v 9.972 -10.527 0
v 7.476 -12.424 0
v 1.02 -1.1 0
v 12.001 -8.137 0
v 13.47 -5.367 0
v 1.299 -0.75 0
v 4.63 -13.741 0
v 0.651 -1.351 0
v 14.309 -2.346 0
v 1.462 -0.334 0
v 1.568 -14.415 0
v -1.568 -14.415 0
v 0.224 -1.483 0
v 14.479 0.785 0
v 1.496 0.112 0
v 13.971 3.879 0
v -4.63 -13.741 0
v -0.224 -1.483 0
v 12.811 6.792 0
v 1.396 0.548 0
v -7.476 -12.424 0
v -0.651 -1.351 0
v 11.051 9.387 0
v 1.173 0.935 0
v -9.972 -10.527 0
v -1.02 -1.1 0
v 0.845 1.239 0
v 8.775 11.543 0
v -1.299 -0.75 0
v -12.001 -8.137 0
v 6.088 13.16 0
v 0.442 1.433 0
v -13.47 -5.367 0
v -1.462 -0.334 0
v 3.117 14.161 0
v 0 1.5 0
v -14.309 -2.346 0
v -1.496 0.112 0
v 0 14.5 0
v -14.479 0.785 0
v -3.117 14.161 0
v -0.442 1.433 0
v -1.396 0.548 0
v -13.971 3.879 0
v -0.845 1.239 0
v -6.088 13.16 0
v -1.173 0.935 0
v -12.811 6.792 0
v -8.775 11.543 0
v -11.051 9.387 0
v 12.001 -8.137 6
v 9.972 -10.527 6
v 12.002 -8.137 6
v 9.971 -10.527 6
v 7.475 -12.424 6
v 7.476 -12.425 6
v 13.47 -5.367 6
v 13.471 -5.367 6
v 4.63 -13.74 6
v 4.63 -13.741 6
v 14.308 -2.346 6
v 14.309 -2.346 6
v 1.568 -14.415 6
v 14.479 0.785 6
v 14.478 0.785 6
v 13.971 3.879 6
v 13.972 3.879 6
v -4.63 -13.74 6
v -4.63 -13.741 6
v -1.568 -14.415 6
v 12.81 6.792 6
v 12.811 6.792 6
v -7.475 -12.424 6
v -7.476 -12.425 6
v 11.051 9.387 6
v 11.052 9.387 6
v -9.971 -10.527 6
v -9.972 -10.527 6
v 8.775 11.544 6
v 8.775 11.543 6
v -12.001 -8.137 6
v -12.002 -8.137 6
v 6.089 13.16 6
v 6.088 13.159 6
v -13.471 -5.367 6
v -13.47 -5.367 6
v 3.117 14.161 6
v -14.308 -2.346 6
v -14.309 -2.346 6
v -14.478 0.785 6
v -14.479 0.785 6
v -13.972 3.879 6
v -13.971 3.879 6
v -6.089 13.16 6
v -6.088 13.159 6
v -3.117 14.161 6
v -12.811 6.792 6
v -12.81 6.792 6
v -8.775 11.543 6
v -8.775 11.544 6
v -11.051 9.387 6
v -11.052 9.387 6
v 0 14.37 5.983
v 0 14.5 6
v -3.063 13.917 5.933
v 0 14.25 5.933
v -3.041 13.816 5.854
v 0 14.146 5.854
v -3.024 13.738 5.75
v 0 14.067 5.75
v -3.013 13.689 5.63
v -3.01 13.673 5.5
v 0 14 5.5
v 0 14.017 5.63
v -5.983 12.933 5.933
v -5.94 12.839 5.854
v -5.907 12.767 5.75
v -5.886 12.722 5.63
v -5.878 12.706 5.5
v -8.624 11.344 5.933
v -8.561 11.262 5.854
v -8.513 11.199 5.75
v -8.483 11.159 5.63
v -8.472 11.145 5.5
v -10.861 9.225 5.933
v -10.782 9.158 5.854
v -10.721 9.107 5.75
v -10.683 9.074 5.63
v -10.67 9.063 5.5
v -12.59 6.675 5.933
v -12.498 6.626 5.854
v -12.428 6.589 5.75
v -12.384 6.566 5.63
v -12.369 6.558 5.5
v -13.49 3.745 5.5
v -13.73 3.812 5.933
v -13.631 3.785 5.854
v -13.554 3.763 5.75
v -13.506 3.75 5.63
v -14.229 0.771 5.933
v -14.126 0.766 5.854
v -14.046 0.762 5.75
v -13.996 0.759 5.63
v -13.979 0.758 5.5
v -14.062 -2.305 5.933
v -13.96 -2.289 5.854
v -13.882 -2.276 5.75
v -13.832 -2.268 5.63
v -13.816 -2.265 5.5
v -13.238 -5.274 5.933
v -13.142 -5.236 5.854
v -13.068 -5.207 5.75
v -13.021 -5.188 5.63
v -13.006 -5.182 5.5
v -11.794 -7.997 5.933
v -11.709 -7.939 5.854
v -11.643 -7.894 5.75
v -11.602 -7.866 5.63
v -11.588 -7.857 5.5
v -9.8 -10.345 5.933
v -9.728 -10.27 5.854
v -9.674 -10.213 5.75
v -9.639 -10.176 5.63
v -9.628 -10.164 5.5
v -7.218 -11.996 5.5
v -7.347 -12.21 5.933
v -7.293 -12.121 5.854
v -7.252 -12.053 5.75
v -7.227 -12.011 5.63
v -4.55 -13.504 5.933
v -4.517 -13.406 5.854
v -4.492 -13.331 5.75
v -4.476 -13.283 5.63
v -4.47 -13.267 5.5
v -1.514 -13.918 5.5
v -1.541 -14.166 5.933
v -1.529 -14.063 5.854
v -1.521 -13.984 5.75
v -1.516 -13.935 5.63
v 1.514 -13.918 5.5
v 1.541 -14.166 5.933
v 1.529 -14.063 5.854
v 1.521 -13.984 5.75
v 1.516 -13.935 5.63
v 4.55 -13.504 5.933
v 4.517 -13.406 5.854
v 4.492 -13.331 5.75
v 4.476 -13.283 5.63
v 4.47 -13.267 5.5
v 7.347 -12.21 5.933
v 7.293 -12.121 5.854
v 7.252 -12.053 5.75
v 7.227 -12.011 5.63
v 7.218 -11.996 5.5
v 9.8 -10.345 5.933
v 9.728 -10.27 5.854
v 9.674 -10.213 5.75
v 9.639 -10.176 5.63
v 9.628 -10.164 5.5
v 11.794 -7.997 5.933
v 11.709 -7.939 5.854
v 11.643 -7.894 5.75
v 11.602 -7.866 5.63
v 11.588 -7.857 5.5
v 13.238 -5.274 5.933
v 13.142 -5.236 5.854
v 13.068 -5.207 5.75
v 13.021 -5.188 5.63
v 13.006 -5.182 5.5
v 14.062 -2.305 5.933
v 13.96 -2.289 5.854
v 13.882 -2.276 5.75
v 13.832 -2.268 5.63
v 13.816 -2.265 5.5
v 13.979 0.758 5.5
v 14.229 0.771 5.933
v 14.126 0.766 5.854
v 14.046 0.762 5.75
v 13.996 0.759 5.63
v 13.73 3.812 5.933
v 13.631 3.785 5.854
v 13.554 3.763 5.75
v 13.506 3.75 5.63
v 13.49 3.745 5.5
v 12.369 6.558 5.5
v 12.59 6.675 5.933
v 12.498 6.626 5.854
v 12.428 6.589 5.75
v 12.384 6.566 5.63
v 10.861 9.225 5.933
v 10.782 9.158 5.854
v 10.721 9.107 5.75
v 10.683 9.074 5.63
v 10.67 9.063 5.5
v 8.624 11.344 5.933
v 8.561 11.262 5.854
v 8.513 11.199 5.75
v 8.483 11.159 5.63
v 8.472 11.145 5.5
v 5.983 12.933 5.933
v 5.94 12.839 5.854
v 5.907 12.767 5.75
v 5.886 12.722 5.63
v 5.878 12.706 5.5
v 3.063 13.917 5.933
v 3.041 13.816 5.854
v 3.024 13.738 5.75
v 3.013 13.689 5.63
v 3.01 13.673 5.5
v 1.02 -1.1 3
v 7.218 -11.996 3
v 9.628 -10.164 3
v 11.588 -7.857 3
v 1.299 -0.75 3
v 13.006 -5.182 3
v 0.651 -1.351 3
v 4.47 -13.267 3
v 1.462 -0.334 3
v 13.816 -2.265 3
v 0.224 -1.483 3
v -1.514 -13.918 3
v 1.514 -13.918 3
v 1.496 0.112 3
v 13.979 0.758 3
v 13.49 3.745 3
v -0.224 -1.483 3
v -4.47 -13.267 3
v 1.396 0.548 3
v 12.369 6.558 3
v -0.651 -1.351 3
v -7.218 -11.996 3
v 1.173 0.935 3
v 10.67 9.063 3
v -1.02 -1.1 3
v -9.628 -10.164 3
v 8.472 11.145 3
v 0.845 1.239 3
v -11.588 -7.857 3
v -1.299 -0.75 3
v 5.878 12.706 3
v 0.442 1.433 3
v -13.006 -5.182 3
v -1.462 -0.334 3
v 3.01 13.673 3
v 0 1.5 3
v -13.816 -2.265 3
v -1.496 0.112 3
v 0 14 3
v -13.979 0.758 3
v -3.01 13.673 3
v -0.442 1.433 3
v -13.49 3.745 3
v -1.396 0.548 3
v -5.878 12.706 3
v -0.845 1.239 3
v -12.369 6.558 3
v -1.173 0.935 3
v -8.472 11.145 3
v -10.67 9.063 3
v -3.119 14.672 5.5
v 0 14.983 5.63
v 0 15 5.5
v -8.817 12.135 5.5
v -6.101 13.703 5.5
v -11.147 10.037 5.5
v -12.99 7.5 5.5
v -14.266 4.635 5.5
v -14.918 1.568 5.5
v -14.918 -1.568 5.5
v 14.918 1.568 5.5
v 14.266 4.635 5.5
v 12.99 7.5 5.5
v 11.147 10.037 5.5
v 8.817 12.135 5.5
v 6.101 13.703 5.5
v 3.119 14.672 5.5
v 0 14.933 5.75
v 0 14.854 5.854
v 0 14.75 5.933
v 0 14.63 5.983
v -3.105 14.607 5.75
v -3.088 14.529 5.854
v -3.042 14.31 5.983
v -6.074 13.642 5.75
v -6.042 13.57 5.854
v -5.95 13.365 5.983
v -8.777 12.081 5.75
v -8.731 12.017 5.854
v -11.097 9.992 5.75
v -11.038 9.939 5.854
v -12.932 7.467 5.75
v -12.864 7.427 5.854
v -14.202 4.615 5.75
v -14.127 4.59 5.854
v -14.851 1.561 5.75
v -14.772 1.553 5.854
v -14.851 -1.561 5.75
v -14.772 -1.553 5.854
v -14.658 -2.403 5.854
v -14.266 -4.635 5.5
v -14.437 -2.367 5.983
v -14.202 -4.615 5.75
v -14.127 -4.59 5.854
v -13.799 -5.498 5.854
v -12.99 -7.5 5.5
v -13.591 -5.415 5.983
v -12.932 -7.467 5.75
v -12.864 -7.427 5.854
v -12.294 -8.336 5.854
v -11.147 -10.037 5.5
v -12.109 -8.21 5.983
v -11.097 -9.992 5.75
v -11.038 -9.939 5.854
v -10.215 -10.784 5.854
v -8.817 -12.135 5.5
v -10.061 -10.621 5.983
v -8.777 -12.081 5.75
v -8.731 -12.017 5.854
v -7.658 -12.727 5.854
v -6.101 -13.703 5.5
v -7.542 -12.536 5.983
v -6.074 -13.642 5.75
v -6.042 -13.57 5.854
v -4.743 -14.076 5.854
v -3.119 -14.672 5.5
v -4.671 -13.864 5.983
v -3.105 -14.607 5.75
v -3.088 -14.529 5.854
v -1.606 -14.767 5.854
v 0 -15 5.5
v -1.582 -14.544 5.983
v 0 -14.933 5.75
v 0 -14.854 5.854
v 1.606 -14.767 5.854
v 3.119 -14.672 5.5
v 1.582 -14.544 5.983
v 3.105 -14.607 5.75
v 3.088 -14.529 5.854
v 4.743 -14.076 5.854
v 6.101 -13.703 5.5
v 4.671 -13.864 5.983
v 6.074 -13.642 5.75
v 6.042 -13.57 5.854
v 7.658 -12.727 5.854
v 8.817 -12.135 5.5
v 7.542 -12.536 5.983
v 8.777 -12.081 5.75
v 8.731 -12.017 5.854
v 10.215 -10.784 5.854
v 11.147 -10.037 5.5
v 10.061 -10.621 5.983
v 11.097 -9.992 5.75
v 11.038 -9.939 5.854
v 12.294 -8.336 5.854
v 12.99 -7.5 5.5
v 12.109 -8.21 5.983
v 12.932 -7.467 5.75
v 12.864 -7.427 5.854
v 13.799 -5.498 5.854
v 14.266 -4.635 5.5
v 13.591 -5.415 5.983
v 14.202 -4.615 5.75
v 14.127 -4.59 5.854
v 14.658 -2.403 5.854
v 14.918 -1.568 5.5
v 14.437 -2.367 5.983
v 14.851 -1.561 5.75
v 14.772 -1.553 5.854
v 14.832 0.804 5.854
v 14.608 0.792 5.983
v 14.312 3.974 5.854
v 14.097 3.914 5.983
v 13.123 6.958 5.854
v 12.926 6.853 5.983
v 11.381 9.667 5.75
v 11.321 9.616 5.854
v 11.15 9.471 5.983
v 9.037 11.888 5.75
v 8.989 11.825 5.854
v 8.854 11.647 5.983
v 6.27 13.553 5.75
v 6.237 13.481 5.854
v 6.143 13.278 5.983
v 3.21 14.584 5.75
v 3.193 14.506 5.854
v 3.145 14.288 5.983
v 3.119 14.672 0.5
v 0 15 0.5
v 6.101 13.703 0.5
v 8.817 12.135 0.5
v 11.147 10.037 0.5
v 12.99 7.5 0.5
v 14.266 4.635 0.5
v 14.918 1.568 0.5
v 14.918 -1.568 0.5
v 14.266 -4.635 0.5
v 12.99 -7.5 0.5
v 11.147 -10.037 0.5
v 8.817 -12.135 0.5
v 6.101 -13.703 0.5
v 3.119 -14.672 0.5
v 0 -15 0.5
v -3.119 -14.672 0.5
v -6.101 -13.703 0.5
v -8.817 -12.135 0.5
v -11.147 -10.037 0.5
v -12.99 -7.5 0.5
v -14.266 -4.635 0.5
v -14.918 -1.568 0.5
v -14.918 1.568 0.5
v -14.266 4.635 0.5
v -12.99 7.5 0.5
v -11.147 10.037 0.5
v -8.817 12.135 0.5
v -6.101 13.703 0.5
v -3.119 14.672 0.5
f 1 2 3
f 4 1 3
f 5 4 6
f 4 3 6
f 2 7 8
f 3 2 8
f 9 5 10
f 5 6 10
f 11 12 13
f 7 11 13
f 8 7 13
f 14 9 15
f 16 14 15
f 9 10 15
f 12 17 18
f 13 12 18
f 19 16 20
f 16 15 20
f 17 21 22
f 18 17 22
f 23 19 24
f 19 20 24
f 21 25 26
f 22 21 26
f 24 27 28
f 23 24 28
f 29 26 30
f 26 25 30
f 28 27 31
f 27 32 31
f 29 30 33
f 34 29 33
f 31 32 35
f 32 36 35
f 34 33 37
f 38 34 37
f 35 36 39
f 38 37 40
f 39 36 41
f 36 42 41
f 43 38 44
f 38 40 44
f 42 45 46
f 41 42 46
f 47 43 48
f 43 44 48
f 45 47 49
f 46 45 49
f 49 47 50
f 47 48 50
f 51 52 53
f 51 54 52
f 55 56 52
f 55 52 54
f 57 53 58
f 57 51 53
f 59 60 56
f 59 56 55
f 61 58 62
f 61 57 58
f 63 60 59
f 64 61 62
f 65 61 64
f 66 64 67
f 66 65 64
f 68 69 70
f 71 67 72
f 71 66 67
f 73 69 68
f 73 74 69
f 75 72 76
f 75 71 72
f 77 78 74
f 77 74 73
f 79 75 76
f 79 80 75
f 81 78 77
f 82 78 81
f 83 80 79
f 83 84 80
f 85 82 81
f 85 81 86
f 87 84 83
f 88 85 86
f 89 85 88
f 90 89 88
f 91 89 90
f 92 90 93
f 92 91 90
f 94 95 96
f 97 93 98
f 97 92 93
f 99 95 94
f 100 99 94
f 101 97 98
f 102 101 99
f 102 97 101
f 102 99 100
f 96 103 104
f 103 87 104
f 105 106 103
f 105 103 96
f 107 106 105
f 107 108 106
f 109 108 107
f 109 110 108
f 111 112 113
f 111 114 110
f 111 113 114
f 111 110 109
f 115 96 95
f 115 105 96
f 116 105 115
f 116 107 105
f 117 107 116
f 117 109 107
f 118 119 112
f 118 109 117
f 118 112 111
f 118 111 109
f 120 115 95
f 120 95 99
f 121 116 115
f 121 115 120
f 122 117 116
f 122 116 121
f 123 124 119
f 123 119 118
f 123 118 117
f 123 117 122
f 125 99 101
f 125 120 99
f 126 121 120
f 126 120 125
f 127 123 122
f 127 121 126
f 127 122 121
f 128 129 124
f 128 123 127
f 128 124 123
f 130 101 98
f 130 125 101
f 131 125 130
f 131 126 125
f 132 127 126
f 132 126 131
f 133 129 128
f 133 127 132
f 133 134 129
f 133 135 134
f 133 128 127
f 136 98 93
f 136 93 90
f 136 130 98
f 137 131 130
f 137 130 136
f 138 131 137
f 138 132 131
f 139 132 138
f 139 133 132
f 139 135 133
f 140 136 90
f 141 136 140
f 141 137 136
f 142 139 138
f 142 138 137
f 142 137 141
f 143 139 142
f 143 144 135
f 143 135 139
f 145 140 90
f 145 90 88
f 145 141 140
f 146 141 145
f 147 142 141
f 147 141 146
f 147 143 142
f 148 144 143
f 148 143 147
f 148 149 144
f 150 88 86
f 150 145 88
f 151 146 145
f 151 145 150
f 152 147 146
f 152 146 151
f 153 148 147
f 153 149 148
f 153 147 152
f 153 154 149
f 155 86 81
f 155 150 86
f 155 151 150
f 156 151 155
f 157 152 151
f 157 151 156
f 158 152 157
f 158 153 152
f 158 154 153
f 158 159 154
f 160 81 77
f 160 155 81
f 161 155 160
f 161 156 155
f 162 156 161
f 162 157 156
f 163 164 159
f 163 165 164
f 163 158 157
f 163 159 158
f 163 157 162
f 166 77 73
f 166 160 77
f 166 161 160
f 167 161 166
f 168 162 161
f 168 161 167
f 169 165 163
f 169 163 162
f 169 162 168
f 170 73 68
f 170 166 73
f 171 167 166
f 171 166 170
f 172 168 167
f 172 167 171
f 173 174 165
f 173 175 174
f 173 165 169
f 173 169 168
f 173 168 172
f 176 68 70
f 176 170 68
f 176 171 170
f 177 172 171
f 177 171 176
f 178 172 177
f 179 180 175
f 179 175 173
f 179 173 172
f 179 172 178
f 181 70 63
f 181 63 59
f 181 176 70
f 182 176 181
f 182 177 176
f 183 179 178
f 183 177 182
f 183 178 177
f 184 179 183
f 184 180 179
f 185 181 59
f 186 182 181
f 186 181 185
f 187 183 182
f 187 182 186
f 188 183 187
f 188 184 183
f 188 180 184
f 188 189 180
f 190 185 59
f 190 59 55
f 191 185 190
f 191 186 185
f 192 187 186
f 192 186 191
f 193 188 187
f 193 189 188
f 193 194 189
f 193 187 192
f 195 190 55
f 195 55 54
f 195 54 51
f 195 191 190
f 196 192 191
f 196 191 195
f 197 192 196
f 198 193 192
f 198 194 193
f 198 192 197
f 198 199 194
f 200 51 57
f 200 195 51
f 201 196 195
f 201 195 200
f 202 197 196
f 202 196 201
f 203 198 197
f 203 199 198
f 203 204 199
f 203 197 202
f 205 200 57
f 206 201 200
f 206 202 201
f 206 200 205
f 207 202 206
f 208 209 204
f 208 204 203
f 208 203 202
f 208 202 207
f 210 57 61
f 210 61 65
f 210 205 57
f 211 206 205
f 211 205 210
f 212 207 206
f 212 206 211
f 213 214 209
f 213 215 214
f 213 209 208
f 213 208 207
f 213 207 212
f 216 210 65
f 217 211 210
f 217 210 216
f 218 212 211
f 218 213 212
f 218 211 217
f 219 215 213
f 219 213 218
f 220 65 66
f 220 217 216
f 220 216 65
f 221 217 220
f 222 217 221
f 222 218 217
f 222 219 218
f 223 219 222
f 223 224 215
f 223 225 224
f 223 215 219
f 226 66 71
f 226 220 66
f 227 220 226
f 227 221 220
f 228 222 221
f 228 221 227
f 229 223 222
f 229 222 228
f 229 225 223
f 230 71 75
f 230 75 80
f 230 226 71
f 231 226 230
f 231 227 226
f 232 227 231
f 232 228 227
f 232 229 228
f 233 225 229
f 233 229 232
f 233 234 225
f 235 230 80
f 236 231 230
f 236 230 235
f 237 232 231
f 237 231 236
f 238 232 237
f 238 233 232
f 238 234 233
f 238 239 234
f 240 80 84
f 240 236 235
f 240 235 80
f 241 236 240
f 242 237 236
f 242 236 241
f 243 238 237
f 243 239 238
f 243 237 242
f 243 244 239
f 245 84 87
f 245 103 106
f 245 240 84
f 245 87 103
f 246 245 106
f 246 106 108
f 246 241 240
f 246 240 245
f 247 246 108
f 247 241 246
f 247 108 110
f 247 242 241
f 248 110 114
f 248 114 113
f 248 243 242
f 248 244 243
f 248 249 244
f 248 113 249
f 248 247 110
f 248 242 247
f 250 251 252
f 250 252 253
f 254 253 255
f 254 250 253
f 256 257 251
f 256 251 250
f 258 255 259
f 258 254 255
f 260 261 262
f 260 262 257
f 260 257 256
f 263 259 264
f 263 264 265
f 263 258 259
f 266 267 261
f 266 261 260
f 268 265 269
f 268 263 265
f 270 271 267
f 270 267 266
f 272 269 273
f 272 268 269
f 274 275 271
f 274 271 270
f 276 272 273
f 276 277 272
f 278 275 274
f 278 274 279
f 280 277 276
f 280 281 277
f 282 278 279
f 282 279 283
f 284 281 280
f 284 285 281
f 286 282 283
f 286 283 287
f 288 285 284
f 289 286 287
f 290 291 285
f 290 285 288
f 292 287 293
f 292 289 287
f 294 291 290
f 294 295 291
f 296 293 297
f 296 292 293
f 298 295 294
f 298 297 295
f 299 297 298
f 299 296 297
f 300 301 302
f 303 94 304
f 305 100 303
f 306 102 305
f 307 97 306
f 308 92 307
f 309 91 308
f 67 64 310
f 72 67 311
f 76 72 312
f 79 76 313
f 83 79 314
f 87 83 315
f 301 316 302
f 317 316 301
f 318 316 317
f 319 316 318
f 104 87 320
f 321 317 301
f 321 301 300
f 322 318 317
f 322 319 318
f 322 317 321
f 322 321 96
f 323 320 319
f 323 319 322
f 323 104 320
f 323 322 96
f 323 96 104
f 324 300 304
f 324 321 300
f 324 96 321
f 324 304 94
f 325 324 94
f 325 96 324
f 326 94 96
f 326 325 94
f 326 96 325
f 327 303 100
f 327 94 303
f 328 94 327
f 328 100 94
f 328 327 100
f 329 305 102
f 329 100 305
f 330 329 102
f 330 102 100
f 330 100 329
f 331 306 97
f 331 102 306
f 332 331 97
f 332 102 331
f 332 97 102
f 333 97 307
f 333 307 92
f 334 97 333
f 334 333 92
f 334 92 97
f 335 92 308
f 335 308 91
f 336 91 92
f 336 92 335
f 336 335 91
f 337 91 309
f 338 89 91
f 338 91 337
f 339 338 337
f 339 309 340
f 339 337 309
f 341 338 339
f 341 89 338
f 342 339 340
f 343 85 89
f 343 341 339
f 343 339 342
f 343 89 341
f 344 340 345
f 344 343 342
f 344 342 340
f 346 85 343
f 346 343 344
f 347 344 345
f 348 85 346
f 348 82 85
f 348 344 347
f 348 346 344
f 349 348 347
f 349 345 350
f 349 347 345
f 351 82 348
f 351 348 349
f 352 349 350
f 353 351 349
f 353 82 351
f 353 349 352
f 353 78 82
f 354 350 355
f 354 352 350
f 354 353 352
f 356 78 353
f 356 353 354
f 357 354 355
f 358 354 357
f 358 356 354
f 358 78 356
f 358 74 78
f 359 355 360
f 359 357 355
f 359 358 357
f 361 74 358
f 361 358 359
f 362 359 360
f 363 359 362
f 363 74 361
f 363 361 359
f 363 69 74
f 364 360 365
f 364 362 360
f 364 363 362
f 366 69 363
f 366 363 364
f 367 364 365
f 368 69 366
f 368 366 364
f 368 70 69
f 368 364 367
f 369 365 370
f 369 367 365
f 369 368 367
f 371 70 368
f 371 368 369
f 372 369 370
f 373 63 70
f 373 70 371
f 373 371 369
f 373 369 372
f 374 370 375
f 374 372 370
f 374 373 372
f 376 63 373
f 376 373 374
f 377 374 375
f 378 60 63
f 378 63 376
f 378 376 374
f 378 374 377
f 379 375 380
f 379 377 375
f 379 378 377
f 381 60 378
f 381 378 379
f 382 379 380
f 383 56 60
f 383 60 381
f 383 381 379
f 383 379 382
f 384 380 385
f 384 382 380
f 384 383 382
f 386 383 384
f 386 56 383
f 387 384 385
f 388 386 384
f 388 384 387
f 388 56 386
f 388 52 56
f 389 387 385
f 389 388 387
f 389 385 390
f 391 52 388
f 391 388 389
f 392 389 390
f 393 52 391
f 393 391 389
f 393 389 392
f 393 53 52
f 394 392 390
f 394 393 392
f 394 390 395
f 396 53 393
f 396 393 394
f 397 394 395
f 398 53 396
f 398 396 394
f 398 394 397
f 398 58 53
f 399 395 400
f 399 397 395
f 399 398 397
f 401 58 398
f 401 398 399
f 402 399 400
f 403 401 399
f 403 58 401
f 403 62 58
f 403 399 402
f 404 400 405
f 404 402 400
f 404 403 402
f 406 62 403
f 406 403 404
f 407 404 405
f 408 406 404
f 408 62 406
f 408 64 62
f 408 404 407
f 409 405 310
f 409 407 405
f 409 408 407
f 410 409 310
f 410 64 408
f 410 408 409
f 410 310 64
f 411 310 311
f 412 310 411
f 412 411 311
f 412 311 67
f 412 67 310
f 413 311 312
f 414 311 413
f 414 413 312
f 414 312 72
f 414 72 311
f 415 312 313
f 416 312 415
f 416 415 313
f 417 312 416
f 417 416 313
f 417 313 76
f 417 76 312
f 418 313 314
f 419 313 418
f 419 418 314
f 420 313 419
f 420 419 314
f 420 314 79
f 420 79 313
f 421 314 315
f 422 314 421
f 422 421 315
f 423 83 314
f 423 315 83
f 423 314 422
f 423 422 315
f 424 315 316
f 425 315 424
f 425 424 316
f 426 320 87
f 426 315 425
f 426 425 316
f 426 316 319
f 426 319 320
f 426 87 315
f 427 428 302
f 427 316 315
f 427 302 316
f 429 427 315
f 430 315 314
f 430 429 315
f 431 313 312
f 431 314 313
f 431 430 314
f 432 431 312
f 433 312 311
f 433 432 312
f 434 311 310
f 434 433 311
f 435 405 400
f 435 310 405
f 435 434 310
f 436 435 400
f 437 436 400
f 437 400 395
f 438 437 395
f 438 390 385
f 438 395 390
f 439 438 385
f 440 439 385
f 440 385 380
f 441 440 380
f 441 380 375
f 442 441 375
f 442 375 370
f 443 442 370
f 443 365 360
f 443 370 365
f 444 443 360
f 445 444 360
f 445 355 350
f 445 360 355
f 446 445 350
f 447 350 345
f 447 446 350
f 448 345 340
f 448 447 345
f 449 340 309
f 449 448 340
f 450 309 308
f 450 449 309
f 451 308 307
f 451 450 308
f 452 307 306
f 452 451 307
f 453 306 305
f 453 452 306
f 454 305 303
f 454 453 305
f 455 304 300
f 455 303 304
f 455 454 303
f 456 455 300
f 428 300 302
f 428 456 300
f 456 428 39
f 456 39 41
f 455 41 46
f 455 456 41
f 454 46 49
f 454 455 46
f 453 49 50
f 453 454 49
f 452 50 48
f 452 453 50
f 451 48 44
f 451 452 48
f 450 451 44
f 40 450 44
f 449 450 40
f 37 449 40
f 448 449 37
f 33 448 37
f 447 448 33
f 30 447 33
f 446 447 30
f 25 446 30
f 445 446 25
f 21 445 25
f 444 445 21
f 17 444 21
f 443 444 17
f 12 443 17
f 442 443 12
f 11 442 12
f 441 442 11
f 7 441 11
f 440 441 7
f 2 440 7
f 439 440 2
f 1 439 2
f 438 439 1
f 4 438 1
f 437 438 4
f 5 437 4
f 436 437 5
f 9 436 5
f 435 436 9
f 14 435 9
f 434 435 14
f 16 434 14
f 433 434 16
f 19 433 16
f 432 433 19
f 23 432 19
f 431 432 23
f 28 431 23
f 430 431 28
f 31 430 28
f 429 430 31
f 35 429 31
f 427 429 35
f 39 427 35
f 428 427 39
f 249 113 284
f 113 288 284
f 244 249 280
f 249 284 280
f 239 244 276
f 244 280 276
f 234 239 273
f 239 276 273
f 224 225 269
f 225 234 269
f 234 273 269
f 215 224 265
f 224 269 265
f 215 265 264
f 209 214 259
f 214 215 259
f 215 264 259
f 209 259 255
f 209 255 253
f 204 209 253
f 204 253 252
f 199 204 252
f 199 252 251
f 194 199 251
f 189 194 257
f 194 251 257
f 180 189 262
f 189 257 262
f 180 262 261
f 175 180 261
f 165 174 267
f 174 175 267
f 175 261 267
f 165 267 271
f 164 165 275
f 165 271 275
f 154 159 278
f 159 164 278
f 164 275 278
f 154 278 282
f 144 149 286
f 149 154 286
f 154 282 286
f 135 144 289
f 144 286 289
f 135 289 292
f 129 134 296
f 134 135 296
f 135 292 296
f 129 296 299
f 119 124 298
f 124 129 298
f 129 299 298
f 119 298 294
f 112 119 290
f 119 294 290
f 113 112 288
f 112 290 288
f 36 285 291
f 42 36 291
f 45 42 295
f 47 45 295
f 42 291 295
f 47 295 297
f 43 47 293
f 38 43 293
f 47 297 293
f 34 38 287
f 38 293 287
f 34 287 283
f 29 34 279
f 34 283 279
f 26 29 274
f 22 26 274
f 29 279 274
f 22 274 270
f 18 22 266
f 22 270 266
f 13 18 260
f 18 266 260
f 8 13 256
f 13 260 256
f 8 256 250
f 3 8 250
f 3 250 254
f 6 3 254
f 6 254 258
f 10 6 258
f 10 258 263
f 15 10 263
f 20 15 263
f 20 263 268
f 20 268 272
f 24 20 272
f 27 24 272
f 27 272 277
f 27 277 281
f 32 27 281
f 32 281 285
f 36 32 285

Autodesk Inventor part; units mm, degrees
ref_plane "YZ Plane" through (0, 0, 0) normal (1, 0, 0) x (0, 1, 0)
ref_plane "XZ Plane" through (0, 0, 0) normal (0, 1, 0) x (-1, 0, 0)
ref_plane "XY Plane" through (0, 0, 0) normal (0, 0, 1) x (1, 0, 0)
sketch "Sketch1" plane through (0, 0, 0) normal (1, 0, 0) x (0, 1, 0)
  line L0 (0, 0) -> (0, 6)
  line L1 (0, 6) -> (14, 6) construction
  line L2 (14, 6) -> (15, 6)
  line L3 (15, 6) -> (15, 0)
  line L4 (15, 0) -> (0, 0)
  line L5 (14, 6) -> (14, 3)
  line L6 (14, 3) -> (0, 3)
  dimension "d0" = 30
  dimension "d1" = 6
  dimension "d2" = 3
  dimension "d3" = 1
revolve "Revolution1" add sketch "Sketch1" angle 360 about axis through (0, 0, 0) along (0, 0, 1)
chamfer "Chamfer1" distance 0.5 angle 45 1 edges at (0, -15, 0)
sketch "Sketch2" plane through (0, 0, 0) normal (0, 0, -1) x (-1, 0, 0)
  point P0 (0, 0)
  point P1 (0, 0)
hole "Hole1" at (0, 0, 0) direction (0, 0, 1) diameter 3 end through all
thread "Thread1" size "M3x0.5" class "6H" standard "ANSI Metric M Profile" full length
fillet "Fillet1" radius 0.5 2 edges at (0, -15, 6) (0, -14, 6)
properties part number "boron-bowl" material "Stainless Steel"
